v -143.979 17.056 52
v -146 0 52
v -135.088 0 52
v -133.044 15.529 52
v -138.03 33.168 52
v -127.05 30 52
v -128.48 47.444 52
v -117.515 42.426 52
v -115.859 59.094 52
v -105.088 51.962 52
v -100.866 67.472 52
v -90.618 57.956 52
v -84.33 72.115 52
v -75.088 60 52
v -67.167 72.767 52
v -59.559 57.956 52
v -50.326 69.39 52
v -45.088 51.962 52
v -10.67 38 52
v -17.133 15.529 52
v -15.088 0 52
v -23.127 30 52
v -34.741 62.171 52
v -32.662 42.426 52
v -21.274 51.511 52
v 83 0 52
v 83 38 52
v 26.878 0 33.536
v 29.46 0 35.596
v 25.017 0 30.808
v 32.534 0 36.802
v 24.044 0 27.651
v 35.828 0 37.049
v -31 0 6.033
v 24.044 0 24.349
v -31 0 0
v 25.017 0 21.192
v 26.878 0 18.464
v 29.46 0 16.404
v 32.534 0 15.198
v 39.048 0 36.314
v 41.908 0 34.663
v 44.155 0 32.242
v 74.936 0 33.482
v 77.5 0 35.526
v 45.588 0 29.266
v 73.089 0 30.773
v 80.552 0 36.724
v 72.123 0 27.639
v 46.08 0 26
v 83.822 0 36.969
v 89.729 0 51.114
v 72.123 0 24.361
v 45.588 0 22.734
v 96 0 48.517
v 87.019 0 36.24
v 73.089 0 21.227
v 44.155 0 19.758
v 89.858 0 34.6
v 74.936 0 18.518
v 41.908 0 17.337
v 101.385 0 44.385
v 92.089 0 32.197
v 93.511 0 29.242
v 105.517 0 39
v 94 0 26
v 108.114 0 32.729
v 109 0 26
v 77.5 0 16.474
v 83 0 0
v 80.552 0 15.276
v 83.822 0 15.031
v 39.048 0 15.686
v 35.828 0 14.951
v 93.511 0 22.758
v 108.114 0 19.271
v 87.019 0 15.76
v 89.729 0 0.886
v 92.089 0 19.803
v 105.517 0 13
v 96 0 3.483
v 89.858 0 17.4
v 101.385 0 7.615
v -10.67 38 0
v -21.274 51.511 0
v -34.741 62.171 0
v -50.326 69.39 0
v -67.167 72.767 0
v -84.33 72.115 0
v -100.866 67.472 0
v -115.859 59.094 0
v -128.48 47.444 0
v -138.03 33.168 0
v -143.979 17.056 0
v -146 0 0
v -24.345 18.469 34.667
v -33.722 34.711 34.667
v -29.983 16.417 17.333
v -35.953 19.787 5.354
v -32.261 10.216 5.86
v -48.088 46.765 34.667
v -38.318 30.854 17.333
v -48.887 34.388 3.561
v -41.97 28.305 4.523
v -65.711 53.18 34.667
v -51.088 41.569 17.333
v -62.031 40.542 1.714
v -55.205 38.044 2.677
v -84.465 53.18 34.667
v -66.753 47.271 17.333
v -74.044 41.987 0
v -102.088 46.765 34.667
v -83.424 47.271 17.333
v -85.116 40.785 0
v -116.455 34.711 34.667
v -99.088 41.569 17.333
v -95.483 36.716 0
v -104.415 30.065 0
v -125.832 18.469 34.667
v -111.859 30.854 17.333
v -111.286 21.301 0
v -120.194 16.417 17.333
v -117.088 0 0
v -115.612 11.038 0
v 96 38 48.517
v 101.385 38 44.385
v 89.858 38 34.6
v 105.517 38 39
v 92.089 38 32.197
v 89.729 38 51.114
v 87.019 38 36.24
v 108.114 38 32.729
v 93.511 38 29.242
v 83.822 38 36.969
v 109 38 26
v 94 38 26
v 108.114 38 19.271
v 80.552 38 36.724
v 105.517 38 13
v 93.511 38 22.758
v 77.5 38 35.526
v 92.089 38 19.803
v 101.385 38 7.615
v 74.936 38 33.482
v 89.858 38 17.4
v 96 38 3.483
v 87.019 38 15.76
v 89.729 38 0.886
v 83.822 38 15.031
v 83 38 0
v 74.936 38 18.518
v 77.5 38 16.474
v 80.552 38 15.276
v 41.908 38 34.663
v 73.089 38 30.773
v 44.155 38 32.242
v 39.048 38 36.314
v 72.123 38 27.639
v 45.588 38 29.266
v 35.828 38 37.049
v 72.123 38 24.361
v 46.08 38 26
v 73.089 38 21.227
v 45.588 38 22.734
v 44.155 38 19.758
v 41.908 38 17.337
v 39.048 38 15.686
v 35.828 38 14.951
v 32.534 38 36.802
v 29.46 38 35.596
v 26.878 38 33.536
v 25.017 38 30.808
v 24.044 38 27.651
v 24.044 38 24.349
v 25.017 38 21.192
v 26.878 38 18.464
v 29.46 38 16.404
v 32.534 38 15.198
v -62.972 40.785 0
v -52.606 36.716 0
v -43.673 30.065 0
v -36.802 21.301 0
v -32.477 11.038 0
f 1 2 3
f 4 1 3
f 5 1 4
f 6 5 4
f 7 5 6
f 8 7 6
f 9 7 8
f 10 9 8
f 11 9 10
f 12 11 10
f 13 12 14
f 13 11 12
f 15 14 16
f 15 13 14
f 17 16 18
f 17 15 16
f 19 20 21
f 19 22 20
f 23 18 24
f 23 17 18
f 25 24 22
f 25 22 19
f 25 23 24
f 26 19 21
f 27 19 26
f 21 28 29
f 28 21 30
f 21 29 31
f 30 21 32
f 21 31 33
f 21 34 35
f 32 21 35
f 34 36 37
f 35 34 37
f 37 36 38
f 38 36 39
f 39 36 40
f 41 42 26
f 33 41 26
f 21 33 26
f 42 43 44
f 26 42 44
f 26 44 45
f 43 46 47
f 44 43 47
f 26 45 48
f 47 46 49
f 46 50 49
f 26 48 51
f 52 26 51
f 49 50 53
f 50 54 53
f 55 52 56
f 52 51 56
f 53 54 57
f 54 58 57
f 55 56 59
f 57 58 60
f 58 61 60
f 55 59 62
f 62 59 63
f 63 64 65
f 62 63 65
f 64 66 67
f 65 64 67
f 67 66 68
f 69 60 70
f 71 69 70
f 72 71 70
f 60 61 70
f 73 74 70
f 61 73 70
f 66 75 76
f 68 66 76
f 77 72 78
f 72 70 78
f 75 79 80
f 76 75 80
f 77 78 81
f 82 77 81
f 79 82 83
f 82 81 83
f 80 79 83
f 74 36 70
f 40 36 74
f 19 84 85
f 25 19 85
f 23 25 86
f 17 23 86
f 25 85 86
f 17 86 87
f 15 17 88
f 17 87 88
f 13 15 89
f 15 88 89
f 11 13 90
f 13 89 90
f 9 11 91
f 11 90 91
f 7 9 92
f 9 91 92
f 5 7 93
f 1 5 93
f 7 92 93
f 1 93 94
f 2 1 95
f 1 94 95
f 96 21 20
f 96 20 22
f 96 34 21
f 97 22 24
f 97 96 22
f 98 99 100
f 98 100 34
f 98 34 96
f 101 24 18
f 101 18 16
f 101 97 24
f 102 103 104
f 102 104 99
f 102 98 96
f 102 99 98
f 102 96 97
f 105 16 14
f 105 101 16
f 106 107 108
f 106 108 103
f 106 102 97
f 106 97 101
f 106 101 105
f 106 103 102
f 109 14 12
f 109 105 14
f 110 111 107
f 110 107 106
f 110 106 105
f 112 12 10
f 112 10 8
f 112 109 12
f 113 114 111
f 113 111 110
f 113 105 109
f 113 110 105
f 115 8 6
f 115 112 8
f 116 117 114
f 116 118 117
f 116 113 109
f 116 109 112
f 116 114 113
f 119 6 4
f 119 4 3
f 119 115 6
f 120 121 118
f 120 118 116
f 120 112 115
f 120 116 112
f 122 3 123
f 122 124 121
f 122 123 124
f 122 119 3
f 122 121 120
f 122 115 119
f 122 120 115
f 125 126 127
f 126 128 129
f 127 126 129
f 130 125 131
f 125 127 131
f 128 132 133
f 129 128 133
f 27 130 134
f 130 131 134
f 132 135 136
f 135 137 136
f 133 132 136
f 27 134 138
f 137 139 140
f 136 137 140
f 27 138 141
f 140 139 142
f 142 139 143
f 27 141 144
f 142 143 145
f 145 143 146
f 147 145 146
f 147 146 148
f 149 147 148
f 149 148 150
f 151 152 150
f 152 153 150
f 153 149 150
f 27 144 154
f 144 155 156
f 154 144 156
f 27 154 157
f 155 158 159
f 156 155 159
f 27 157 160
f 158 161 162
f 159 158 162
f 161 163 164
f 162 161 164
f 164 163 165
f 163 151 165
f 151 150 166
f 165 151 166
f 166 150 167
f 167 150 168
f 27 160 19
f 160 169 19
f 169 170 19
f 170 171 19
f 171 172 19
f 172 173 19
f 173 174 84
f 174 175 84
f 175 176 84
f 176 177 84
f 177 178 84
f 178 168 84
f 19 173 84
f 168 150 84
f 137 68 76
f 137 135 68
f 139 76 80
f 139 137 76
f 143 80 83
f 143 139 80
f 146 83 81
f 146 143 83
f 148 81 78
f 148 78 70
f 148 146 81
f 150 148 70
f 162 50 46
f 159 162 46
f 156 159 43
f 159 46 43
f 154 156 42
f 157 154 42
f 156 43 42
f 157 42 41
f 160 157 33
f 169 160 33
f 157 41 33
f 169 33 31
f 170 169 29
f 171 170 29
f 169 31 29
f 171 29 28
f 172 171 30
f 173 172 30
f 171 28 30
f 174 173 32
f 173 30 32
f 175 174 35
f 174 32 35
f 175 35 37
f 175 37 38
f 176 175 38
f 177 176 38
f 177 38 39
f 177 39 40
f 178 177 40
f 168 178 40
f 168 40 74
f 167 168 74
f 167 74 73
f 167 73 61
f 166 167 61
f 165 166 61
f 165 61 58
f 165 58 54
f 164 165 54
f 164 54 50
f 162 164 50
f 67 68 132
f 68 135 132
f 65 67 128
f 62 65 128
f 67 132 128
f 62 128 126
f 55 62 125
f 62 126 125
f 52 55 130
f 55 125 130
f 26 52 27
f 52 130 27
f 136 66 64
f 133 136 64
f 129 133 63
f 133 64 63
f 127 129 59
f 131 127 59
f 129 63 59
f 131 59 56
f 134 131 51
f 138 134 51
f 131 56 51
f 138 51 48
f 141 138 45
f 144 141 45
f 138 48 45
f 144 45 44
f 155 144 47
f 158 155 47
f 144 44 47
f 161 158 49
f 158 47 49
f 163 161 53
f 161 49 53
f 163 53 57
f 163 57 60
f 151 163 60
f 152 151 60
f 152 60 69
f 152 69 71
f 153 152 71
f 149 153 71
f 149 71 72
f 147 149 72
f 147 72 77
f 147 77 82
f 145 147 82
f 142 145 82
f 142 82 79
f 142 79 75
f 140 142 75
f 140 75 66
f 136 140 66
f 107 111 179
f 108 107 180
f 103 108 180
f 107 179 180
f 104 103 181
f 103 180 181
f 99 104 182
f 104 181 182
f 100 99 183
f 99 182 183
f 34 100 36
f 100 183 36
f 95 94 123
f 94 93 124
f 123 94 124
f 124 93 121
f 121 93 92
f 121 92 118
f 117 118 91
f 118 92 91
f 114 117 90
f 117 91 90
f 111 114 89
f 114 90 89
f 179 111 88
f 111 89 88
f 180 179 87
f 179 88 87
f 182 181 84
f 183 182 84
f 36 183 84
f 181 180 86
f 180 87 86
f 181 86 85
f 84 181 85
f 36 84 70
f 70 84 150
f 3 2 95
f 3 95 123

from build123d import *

# Parameters (mm, degrees)
F1_DEPTH = 52
F2_R     = 11.0802059784
F2_R_2   = 11
F3_DEPTH = 51.6
F4_R     = 25.99999


# Not quite as in the source:
# - a fillet or chamfer is up to 0.001 mm smaller than in the source, because OpenCascade refuses the exact size


with BuildPart() as f1:
    # F0 (on Top) → F1 (new body)
    with BuildSketch(Plane.XY):
        with BuildLine():
            Line((109, 38), (-10.670231831, 38))
            ThreePointArc((-10.670231831, 38), (-92.7348286497, 70.2818364741), (-146, 0))
            Line((-146, 0), (-115, 0))
            ThreePointArc((-115, 0), (-73, 42), (-31, 0))
            Line((-31, 0), (109, 0))
            Line((109, 0), (109, 38))
        make_face()
    extrude(amount=F1_DEPTH)

    # F2 (on face) → F3 (cut)
    with BuildSketch(Plane.XZ):
        with Locations((35, 26)):
            Circle(F2_R)
        with Locations((83, 26)):
            Circle(F2_R_2)
    extrude(amount=-F3_DEPTH, mode=Mode.SUBTRACT)

    # F4 (radius 26 in the source; OpenCascade refuses exactly that, so slightly less here)
    f4_edges = [f1.edges().sort_by_distance(p)[0] for p in [
        (109, 19, 52),
        (109, 19, 0),
    ]]
    fillet(f4_edges, radius=F4_R)

    # F5 (on face) → F6 (revolve, cut)
    with BuildSketch(Plane.XZ):
        Polygon((-75.0884139538, 52), (-135.0884139538, 52), (-117.0884139538, 0), (-75.0884139538, 0), align=None)
    revolve(axis=Axis((-75.0884139538, 0, 26), (0, 0, 1)), mode=Mode.SUBTRACT)


solid = f1.part
